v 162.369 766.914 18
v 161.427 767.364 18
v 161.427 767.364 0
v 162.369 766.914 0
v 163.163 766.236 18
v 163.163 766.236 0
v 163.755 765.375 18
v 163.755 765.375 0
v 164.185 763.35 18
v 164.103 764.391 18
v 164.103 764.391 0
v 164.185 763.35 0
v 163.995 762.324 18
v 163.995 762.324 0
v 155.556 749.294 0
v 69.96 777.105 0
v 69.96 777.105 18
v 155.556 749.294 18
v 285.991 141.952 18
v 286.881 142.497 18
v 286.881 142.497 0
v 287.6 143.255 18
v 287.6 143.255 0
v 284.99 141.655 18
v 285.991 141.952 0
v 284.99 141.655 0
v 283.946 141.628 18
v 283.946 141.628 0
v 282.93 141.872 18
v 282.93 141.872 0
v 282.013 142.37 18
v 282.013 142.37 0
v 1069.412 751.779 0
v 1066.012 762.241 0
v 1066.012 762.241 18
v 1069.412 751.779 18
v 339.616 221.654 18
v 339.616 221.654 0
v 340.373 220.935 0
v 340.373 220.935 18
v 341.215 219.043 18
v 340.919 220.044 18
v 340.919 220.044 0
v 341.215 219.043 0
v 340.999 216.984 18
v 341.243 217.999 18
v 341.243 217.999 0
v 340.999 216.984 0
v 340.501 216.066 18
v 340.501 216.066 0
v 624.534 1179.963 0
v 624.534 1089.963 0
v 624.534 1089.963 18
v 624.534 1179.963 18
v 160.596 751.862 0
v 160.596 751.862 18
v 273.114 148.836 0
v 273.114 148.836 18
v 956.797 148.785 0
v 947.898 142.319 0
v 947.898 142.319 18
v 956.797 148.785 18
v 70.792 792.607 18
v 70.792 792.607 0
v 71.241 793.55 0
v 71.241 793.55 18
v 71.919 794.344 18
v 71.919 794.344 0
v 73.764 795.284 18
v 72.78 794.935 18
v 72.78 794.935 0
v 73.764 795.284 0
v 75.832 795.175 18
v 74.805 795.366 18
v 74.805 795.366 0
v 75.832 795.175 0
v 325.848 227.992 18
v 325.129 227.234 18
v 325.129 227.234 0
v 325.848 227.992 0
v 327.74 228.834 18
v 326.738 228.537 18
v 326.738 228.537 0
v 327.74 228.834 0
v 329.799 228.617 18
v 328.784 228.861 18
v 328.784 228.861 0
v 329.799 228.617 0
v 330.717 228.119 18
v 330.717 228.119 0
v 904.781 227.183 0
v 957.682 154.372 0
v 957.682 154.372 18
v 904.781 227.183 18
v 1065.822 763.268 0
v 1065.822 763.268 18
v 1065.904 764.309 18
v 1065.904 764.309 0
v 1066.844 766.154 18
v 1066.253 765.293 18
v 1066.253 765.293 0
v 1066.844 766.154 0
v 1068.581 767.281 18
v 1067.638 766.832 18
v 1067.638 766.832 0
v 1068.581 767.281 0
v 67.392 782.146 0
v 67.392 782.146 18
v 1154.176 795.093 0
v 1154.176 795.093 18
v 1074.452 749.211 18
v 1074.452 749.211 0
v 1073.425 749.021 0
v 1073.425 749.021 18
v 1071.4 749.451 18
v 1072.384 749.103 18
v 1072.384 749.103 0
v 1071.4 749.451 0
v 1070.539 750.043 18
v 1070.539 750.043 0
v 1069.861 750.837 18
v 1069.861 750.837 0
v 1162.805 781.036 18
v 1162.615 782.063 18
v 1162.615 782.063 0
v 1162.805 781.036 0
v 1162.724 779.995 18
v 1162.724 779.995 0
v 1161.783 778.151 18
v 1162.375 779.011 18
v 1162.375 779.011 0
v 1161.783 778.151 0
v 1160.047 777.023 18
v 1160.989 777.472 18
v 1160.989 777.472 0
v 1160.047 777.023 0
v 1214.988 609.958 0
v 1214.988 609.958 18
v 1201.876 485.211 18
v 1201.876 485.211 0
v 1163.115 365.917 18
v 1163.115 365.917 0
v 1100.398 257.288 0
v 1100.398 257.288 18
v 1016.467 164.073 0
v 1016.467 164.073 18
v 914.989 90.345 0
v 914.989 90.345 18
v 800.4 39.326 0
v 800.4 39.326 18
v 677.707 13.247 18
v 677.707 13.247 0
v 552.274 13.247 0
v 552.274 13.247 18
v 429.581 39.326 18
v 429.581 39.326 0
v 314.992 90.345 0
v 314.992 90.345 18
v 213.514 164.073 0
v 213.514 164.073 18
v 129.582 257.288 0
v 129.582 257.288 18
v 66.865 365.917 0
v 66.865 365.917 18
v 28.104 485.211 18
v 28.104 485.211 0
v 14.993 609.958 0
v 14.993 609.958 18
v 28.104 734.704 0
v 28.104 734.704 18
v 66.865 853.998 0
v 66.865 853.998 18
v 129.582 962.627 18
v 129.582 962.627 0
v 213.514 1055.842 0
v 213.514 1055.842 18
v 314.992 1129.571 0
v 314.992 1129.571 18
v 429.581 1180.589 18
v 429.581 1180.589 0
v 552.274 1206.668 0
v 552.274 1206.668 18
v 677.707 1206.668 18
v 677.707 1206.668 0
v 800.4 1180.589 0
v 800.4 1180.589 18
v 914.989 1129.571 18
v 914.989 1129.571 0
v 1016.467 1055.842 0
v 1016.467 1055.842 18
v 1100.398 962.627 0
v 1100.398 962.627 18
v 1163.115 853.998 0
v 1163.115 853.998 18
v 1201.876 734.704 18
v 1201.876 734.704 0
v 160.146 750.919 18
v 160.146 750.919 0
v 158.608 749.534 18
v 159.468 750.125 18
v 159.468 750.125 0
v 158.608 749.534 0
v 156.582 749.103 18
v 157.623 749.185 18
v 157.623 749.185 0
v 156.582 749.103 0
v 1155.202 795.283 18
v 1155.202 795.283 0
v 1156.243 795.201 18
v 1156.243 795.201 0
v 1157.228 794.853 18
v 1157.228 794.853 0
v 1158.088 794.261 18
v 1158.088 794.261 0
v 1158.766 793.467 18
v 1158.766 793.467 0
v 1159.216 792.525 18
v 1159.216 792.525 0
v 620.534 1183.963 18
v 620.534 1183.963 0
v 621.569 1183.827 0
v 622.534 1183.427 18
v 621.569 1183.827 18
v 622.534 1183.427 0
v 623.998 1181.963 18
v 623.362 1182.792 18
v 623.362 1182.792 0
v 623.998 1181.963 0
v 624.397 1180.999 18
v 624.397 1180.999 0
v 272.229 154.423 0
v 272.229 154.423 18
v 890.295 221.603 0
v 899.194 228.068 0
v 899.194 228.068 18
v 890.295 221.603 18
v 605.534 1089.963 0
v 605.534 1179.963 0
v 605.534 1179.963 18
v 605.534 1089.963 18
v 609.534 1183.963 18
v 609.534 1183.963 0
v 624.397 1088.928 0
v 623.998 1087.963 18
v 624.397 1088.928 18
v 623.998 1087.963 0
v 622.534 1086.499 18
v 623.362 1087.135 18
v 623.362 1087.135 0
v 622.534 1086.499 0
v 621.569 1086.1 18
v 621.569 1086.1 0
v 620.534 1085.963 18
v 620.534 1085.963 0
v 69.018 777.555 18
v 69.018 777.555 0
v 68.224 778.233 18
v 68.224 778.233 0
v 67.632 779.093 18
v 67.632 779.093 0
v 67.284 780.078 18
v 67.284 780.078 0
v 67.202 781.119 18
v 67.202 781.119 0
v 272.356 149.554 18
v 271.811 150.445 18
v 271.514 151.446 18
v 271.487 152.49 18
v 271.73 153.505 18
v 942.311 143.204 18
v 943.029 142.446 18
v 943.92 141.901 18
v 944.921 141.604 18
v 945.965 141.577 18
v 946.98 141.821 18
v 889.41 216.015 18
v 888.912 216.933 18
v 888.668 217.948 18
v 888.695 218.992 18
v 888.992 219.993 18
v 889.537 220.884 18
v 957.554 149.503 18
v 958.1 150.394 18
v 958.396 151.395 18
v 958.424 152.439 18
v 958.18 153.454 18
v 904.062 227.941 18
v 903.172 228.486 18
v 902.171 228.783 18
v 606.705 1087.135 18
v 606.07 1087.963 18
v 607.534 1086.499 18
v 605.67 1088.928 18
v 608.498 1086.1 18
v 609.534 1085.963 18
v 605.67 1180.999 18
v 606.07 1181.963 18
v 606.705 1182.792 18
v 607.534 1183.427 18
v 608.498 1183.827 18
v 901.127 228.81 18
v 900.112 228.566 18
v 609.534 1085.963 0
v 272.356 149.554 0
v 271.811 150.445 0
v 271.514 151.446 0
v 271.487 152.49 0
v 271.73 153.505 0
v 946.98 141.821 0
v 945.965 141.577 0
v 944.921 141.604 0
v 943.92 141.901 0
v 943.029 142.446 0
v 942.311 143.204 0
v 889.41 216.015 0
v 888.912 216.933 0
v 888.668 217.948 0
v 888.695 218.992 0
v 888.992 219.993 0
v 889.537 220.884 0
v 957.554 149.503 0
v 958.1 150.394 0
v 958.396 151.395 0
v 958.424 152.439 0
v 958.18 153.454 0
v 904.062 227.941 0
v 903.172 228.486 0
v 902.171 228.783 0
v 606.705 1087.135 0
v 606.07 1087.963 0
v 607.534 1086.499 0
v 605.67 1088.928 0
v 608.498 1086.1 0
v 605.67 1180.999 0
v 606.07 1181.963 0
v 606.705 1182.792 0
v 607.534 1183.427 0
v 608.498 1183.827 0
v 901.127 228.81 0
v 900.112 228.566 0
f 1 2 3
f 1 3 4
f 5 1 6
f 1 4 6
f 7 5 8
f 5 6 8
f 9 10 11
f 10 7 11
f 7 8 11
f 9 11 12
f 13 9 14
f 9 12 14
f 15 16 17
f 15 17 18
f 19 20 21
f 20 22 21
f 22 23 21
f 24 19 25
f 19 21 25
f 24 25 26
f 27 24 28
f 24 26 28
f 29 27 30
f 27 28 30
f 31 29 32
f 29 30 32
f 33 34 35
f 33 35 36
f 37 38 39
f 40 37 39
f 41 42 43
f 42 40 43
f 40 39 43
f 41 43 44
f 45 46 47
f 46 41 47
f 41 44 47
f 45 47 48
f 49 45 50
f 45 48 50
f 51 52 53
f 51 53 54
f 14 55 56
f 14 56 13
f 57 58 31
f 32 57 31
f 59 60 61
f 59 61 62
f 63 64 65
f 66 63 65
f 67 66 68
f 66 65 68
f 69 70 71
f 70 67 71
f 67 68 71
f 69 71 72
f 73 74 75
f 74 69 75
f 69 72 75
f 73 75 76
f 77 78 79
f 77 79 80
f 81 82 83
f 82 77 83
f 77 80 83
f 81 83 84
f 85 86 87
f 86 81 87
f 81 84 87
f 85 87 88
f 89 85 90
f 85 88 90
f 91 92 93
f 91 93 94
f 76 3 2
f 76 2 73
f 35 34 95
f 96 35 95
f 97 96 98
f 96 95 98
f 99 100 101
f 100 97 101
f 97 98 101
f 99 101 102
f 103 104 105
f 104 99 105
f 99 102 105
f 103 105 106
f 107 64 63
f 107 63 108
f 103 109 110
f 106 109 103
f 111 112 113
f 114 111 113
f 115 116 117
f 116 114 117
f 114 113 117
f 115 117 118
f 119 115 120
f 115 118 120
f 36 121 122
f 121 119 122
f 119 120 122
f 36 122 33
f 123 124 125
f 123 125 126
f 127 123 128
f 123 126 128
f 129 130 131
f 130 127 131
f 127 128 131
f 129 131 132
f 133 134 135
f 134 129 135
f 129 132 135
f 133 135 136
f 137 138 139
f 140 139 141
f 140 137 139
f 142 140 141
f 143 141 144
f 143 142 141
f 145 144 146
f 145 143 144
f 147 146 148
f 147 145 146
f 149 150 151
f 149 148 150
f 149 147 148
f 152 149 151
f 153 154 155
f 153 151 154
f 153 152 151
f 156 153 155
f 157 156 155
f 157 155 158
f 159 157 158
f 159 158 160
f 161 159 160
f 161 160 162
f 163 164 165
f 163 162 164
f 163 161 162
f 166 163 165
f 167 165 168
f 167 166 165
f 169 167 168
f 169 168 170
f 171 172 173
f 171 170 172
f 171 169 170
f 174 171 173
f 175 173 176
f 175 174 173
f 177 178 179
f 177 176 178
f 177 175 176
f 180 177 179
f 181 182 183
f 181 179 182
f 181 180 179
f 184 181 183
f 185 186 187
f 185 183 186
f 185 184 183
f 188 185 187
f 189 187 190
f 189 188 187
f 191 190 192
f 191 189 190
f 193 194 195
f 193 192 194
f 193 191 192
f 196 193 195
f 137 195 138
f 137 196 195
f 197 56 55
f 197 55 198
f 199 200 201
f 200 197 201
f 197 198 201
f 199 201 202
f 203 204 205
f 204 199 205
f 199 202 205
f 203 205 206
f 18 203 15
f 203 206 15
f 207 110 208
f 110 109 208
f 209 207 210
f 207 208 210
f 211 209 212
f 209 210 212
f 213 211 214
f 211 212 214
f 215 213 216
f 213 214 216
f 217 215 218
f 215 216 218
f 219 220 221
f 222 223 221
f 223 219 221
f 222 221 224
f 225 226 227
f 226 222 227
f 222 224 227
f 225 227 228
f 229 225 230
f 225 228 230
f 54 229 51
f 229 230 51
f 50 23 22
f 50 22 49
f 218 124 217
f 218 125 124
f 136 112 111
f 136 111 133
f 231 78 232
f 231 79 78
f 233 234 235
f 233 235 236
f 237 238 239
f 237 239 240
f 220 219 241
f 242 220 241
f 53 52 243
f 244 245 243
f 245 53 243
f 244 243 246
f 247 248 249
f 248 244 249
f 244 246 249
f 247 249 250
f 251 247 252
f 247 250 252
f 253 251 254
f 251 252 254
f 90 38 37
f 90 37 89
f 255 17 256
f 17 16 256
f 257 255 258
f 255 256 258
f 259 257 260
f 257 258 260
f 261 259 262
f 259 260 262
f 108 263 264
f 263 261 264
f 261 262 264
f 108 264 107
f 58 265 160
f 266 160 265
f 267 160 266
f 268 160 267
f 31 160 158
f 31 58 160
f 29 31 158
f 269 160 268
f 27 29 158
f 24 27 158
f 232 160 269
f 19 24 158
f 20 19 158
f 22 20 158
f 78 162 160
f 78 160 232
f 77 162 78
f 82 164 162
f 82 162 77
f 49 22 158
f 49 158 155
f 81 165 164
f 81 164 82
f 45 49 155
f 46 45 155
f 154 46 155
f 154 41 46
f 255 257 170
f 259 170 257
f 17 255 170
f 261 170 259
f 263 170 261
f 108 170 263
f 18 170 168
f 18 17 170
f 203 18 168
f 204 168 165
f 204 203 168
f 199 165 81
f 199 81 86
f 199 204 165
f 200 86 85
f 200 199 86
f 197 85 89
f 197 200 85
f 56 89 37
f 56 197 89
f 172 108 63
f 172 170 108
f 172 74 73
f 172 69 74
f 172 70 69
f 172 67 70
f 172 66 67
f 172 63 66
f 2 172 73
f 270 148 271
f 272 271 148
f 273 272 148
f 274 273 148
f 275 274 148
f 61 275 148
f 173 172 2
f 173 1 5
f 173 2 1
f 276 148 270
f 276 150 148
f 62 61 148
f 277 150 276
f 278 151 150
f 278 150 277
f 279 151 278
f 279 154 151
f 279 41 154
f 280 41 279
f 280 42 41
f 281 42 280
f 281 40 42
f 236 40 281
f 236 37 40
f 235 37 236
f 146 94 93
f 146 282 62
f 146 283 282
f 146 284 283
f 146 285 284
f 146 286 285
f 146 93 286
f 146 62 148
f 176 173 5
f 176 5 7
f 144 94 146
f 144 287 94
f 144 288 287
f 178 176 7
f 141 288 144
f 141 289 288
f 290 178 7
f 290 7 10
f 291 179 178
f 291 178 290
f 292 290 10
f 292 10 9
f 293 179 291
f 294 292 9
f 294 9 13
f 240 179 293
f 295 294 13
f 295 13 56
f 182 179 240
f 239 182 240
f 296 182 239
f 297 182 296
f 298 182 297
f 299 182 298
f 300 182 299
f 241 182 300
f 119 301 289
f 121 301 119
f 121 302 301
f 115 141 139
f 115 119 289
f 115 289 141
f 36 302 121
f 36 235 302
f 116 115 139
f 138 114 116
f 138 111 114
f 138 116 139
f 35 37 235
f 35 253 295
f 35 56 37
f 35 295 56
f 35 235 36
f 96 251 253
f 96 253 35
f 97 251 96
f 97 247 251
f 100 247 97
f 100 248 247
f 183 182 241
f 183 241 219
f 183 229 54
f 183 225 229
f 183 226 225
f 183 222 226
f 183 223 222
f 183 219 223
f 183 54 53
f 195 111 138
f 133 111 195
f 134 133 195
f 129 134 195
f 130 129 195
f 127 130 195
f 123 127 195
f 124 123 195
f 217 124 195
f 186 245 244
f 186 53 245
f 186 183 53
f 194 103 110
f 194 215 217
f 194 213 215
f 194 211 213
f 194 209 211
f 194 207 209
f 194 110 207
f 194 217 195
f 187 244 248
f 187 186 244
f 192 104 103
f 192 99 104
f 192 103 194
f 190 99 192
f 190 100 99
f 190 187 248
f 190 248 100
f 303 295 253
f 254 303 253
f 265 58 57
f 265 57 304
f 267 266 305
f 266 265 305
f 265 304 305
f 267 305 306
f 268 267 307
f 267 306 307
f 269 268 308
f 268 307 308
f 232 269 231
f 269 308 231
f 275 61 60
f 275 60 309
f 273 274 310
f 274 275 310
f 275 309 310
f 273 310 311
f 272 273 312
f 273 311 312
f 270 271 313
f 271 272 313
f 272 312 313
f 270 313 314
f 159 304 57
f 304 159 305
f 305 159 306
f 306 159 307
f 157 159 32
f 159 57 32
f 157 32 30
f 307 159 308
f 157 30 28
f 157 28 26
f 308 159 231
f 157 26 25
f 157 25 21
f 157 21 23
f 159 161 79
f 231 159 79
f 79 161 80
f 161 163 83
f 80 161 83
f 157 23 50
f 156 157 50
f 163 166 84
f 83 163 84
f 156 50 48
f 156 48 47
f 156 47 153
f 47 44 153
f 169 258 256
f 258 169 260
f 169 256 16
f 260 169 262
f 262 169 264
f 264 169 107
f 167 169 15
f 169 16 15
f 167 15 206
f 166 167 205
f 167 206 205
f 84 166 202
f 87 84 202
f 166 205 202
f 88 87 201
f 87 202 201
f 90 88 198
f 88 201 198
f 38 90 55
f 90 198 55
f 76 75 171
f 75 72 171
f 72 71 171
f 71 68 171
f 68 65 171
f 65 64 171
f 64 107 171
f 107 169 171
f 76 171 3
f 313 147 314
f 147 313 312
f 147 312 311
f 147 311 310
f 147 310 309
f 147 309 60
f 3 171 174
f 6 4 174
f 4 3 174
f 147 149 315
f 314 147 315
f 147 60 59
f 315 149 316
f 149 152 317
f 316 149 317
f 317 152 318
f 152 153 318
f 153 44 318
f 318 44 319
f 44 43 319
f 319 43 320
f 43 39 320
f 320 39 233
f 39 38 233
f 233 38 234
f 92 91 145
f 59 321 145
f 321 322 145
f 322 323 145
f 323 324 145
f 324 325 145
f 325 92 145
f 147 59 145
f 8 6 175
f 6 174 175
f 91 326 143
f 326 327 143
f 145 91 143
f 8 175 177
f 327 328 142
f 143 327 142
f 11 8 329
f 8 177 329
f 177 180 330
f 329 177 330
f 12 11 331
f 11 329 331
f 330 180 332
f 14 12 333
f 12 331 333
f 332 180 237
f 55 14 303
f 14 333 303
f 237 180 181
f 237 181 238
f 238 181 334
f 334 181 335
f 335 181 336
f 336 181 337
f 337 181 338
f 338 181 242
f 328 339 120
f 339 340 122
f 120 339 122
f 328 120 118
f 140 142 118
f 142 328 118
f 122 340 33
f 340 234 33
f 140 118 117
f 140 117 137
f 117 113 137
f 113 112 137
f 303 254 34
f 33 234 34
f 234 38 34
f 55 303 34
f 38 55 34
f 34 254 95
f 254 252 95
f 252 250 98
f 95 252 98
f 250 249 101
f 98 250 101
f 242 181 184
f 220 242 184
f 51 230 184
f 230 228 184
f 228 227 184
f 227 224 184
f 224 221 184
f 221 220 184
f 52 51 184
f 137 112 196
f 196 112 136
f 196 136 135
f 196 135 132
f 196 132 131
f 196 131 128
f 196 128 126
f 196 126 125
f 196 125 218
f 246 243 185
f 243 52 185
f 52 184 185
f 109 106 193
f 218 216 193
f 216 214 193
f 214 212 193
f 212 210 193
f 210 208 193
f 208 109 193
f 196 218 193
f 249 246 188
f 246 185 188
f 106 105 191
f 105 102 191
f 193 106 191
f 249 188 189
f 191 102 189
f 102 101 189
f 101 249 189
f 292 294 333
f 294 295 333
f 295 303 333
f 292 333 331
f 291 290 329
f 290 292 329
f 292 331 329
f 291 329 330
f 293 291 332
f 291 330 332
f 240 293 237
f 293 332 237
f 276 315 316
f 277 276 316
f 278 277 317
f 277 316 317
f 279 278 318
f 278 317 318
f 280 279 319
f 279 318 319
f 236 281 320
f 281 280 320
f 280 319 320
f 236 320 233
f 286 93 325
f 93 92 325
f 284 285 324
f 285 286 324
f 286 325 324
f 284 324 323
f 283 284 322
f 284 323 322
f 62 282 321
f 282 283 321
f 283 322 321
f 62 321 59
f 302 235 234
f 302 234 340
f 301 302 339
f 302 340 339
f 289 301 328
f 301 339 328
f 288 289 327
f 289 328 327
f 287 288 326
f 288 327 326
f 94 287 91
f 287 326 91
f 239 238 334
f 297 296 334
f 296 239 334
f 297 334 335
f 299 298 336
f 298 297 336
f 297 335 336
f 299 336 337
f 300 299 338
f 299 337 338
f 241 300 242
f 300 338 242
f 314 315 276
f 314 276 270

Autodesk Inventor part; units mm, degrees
ref_plane "YZ Plane" through (0, 0, 0) normal (1, 0, 0) x (0, 1, 0)
ref_plane "XZ Plane" through (0, 0, 0) normal (0, 1, 0) x (-1, 0, 0)
ref_plane "XY Plane" through (0, 0, 0) normal (0, 0, 1) x (1, 0, 0)
sketch "CONTOURS" plane through (0, 0, 0) normal (0, 0, 1) x (1, 0, 0)
  circle A0 centre (614.9903, 609.9576) radius 599.9973
  dimension "d3" = 1199.9946
sketch "HOLES" plane through (0, 0, 0) normal (0, 0, 1) x (1, 0, 0)
  line L0 (1162.6152, 782.0631) -> (1159.216, 792.5247)
  arc A0 (1159.216, 792.5247) -> (1154.1757, 795.0928) centre (1155.4118, 791.2886) ccw
  line L1 (1154.1757, 795.0928) -> (1068.5806, 767.2813)
  arc A1 (1068.5806, 767.2813) -> (1066.0124, 762.241) centre (1069.8167, 763.4771) ccw
  line L2 (1066.0124, 762.241) -> (1069.4116, 751.7794)
  arc A2 (1069.4116, 751.7794) -> (1074.4519, 749.2112) centre (1073.2159, 753.0155) ccw
  line L3 (1074.4519, 749.2112) -> (1160.047, 777.0228)
  arc A3 (1160.047, 777.0228) -> (1162.6152, 782.0631) centre (1158.8109, 780.827) ccw
  line L4 (947.8978, 142.3189) -> (956.7969, 148.7846)
  arc A4 (956.7969, 148.7846) -> (957.6819, 154.3718) centre (954.4458, 152.0206) ccw
  line L5 (957.6819, 154.3718) -> (904.7812, 227.1833)
  arc A5 (904.7812, 227.1833) -> (899.194, 228.0682) centre (901.5451, 224.8322) ccw
  line L6 (899.194, 228.0682) -> (890.2948, 221.6026)
  arc A6 (890.2948, 221.6026) -> (889.4099, 216.0154) centre (892.6459, 218.3665) ccw
  line L7 (889.4099, 216.0154) -> (942.3106, 143.2039)
  arc A7 (942.3106, 143.2039) -> (947.8978, 142.3189) centre (945.5466, 145.555) ccw
  line L8 (620.5337, 1183.9633) -> (609.5337, 1183.9633)
  arc A8 (609.5337, 1183.9633) -> (605.5337, 1179.9633) centre (609.5337, 1179.9633) ccw
  line L9 (605.5337, 1179.9633) -> (605.5337, 1089.9633)
  arc A9 (605.5337, 1089.9633) -> (609.5337, 1085.9633) centre (609.5337, 1089.9633) ccw
  line L10 (609.5337, 1085.9633) -> (620.5337, 1085.9633)
  arc A10 (620.5337, 1085.9633) -> (624.5337, 1089.9633) centre (620.5337, 1089.9633) ccw
  line L11 (624.5337, 1089.9633) -> (624.5337, 1179.9633)
  arc A11 (624.5337, 1179.9633) -> (620.5337, 1183.9633) centre (620.5337, 1179.9633) ccw
  line L12 (273.1136, 148.8355) -> (282.0128, 142.3699)
  arc A12 (282.0128, 142.3699) -> (287.6, 143.2548) centre (284.3639, 145.6059) ccw
  line L13 (287.6, 143.2548) -> (340.5007, 216.0663)
  arc A13 (340.5007, 216.0663) -> (339.6157, 221.6535) centre (337.2646, 218.4175) ccw
  line L14 (339.6157, 221.6535) -> (330.7166, 228.1192)
  arc A14 (330.7166, 228.1192) -> (325.1293, 227.2342) centre (328.3654, 224.8831) ccw
  line L15 (325.1293, 227.2342) -> (272.2287, 154.4227)
  arc A15 (272.2287, 154.4227) -> (273.1136, 148.8355) centre (275.4647, 152.0716) ccw
  line L16 (70.7915, 792.6071) -> (67.3923, 782.1455)
  arc A16 (67.3923, 782.1455) -> (69.9604, 777.1052) centre (71.1965, 780.9094) ccw
  line L17 (69.9604, 777.1052) -> (155.5555, 749.2937)
  arc A17 (155.5555, 749.2937) -> (160.5958, 751.8618) centre (156.7916, 753.0979) ccw
  line L18 (160.5958, 751.8618) -> (163.995, 762.3235)
  arc A18 (163.995, 762.3235) -> (161.4268, 767.3637) centre (160.1908, 763.5595) ccw
  line L19 (161.4268, 767.3637) -> (75.8318, 795.1753)
  arc A19 (75.8318, 795.1753) -> (70.7915, 792.6071) centre (74.5957, 791.371) ccw
  dimension "d1" = 19
  dimension "d19" = 90
sketch "LETTERS" plane through (0, 0, 0) normal (0, 0, 1) x (1, 0, 0)
  line L0 (622.9768, 614.1235) -> (622.8555, 614.5546)
  line L1 (622.8555, 614.5546) -> (622.7333, 614.956)
  line L2 (622.7333, 614.956) -> (622.6101, 615.3276)
  line L3 (622.6101, 615.3276) -> (622.4861, 615.6694)
  line L4 (622.4861, 615.6694) -> (622.4237, 615.8291)
  line L5 (622.4237, 615.8291) -> (622.3611, 615.9814)
  line L6 (622.3611, 615.9814) -> (622.2982, 616.1262)
  line L7 (622.2982, 616.1262) -> (622.2351, 616.2636)
  line L8 (622.2351, 616.2636) -> (622.1718, 616.3935)
  line L9 (622.1718, 616.3935) -> (622.1083, 616.516)
  line L10 (622.1083, 616.516) -> (622.0445, 616.631)
  line L11 (622.0445, 616.631) -> (621.9805, 616.7386)
  line L12 (621.9805, 616.7386) -> (621.9154, 616.8417)
  line L13 (621.9154, 616.8417) -> (621.8484, 616.943)
  line L14 (621.8484, 616.943) -> (621.7795, 617.0428)
  line L15 (621.7795, 617.0428) -> (621.7087, 617.1408)
  line L16 (621.7087, 617.1408) -> (621.6361, 617.2373)
  line L17 (621.6361, 617.2373) -> (621.5615, 617.3321)
  line L18 (621.5615, 617.3321) -> (621.485, 617.4252)
  line L19 (621.485, 617.4252) -> (621.4066, 617.5167)
  line L20 (621.4066, 617.5167) -> (621.3264, 617.6065)
  line L21 (621.3264, 617.6065) -> (621.2442, 617.6947)
  line L22 (621.2442, 617.6947) -> (621.1602, 617.7812)
  line L23 (621.1602, 617.7812) -> (621.0742, 617.8661)
  line L24 (621.0742, 617.8661) -> (620.9864, 617.9494)
  line L25 (620.9864, 617.9494) -> (620.8966, 618.031)
  line L26 (620.8966, 618.031) -> (620.805, 618.1109)
  line L27 (620.805, 618.1109) -> (620.7115, 618.1892)
  line L28 (620.7115, 618.1892) -> (620.5209, 618.3409)
  line L29 (620.5209, 618.3409) -> (620.3269, 618.4859)
  line L30 (620.3269, 618.4859) -> (620.1297, 618.6242)
  line L31 (620.1297, 618.6242) -> (619.9292, 618.756)
  line L32 (619.9292, 618.756) -> (619.7254, 618.8811)
  line L33 (619.7254, 618.8811) -> (619.5183, 618.9995)
  line L34 (619.5183, 618.9995) -> (619.3079, 619.1114)
  line L35 (619.3079, 619.1114) -> (619.0942, 619.2166)
  line L36 (619.0942, 619.2166) -> (618.9858, 619.2666)
  line L37 (618.9858, 619.2666) -> (618.8761, 619.3148)
  line L38 (618.8761, 619.3148) -> (618.765, 619.3612)
  line L39 (618.765, 619.3612) -> (618.6526, 619.4058)
  line L40 (618.6526, 619.4058) -> (618.5388, 619.4485)
  line L41 (618.5388, 619.4485) -> (618.4237, 619.4895)
  line L42 (618.4237, 619.4895) -> (618.3072, 619.5286)
  line L43 (618.3072, 619.5286) -> (618.1894, 619.5658)
  line L44 (618.1894, 619.5658) -> (617.9497, 619.6349)
  line L45 (617.9497, 619.6349) -> (617.7046, 619.6967)
  line L46 (617.7046, 619.6967) -> (617.454, 619.7512)
  line L47 (617.454, 619.7512) -> (617.1981, 619.7984)
  line L48 (617.1981, 619.7984) -> (616.9346, 619.8392)
  line L49 (616.9346, 619.8392) -> (616.6613, 619.8746)
  line L50 (616.6613, 619.8746) -> (616.3784, 619.9045)
  line L51 (616.3784, 619.9045) -> (616.0858, 619.929)
  line L52 (616.0858, 619.929) -> (615.7835, 619.9481)
  line L53 (615.7835, 619.9481) -> (615.4715, 619.9617)
  line L54 (615.4715, 619.9617) -> (614.8184, 619.9726)
  line L55 (614.8184, 619.9726) -> (614.1719, 619.964)
  line L56 (614.1719, 619.964) -> (613.5774, 619.9385)
  line L57 (613.5774, 619.9385) -> (613.2996, 619.9194)
  line L58 (613.2996, 619.9194) -> (613.0349, 619.8959)
  line L59 (613.0349, 619.8959) -> (612.7831, 619.8683)
  line L60 (612.7831, 619.8683) -> (612.5443, 619.8364)
  line L61 (612.5443, 619.8364) -> (612.3121, 619.7985)
  line L62 (612.3121, 619.7985) -> (612.0798, 619.7532)
  line L63 (612.0798, 619.7532) -> (611.8476, 619.7002)
  line L64 (611.8476, 619.7002) -> (611.6153, 619.6397)
  line L65 (611.6153, 619.6397) -> (611.383, 619.5717)
  line L66 (611.383, 619.5717) -> (611.1508, 619.4961)
  line L67 (611.1508, 619.4961) -> (610.9185, 619.4129)
  line L68 (610.9185, 619.4129) -> (610.6862, 619.3222)
  line L69 (610.6862, 619.3222) -> (610.4529, 619.2229)
  line L70 (610.4529, 619.2229) -> (610.2174, 619.1139)
  line L71 (610.2174, 619.1139) -> (609.9798, 618.9952)
  line L72 (609.9798, 618.9952) -> (609.74, 618.8669)
  line L73 (609.74, 618.8669) -> (609.4981, 618.7289)
  line L74 (609.4981, 618.7289) -> (609.2541, 618.5813)
  line L75 (609.2541, 618.5813) -> (609.0078, 618.424)
  line L76 (609.0078, 618.424) -> (608.7595, 618.257)
  line L77 (608.7595, 618.257) -> (608.6356, 618.1697)
  line L78 (608.6356, 618.1697) -> (608.5134, 618.0797)
  line L79 (608.5134, 618.0797) -> (608.3928, 617.987)
  line L80 (608.3928, 617.987) -> (608.2739, 617.8916)
  line L81 (608.2739, 617.8916) -> (608.1567, 617.7935)
  line L82 (608.1567, 617.7935) -> (608.0411, 617.6927)
  line L83 (608.0411, 617.6927) -> (607.9272, 617.5891)
  line L84 (607.9272, 617.5891) -> (607.8149, 617.4828)
  line L85 (607.8149, 617.4828) -> (607.7043, 617.3739)
  line L86 (607.7043, 617.3739) -> (607.5953, 617.2622)
  line L87 (607.5953, 617.2622) -> (607.488, 617.1478)
  line L88 (607.488, 617.1478) -> (607.3824, 617.0307)
  line L89 (607.3824, 617.0307) -> (607.2784, 616.9108)
  line L90 (607.2784, 616.9108) -> (607.176, 616.7883)
  line L91 (607.176, 616.7883) -> (607.0754, 616.663)
  line L92 (607.0754, 616.663) -> (606.9764, 616.5351)
  line L93 (606.9764, 616.5351) -> (606.8795, 616.4051)
  line L94 (606.8795, 616.4051) -> (606.7852, 616.2738)
  line L95 (618.3393, 599.944) -> (618.5538, 599.9977)
  line L96 (618.5538, 599.9977) -> (618.7672, 600.0568)
  line L97 (618.7672, 600.0568) -> (618.9794, 600.1214)
  line L98 (618.9794, 600.1214) -> (619.1905, 600.1913)
  line L99 (619.1905, 600.1913) -> (619.4004, 600.2667)
  line L100 (619.4004, 600.2667) -> (619.6092, 600.3476)
  line L101 (619.6092, 600.3476) -> (619.8168, 600.4339)
  line L102 (619.8168, 600.4339) -> (620.0233, 600.5256)
  line L103 (620.0233, 600.5256) -> (620.2287, 600.6223)
  line L104 (620.2287, 600.6223) -> (620.4332, 600.7235)
  line L105 (620.4332, 600.7235) -> (620.6368, 600.8291)
  line L106 (620.6368, 600.8291) -> (620.8394, 600.9391)
  line L107 (620.8394, 600.9391) -> (621.0411, 601.0536)
  line L108 (621.0411, 601.0536) -> (621.2419, 601.1726)
  line L109 (621.2419, 601.1726) -> (621.4418, 601.296)
  line L110 (621.4418, 601.296) -> (621.6408, 601.4239)
  line L111 (621.6408, 601.4239) -> (622.3722, 601.9163)
  line L112 (622.3722, 601.9163) -> (622.691, 602.1415)
  line L113 (622.691, 602.1415) -> (622.9785, 602.3528)
  line L114 (622.9785, 602.3528) -> (623.4053, 602.6781)
  line L115 (623.4053, 602.6781) -> (623.5311, 602.7785)
  line L116 (623.5311, 602.7785) -> (623.572, 602.8131)
  line L117 (605.8556, 614.5967) -> (605.795, 614.4485)
  line L118 (623.587, 602.8265) -> (623.5931, 602.8322)
  line L119 (623.5931, 602.8322) -> (623.5983, 602.8373)
  line L120 (623.5983, 602.8373) -> (623.5992, 609.9994)
  line L121 (623.5992, 609.9994) -> (615.0012, 610.0005)
  line L122 (605.7369, 614.299) -> (605.5299, 613.7237)
  line L123 (605.5299, 613.7237) -> (605.4413, 613.4552)
  line L124 (605.4413, 613.4552) -> (605.3626, 613.1994)
  line L125 (605.3626, 613.1994) -> (605.294, 612.9564)
  line L126 (605.294, 612.9564) -> (605.2353, 612.7261)
  line L127 (605.2353, 612.7261) -> (605.1866, 612.5085)
  line L128 (605.1866, 612.5085) -> (605.1659, 612.4045)
  line L129 (605.1659, 612.4045) -> (605.1478, 612.3036)
  line L130 (605.1478, 612.3036) -> (605.0844, 611.8916)
  line L131 (605.0844, 611.8916) -> (605.0293, 611.4495)
  line L132 (605.0293, 611.4495) -> (604.9825, 610.9774)
  line L133 (604.9825, 610.9774) -> (604.944, 610.4751)
  line L134 (604.944, 610.4751) -> (604.9301, 610.2143)
  line L135 (604.9301, 610.2143) -> (604.9225, 609.9493)
  line L136 (604.9225, 609.9493) -> (604.9214, 609.68)
  line L137 (604.9214, 609.68) -> (604.9266, 609.4064)
  line L138 (604.9266, 609.4064) -> (604.9383, 609.1286)
  line L139 (604.9383, 609.1286) -> (604.9563, 608.8465)
  line L140 (604.9563, 608.8465) -> (604.9808, 608.5602)
  line L141 (604.9808, 608.5602) -> (605.0116, 608.2696)
  line L142 (605.0116, 608.2696) -> (605.049, 607.9781)
  line L143 (605.049, 607.9781) -> (605.0929, 607.6889)
  line L144 (605.0929, 607.6889) -> (605.1434, 607.4021)
  line L145 (605.1434, 607.4021) -> (605.2006, 607.1176)
  line L146 (605.2006, 607.1176) -> (605.2643, 606.8354)
  line L147 (605.2643, 606.8354) -> (605.3347, 606.5556)
  line L148 (605.3347, 606.5556) -> (605.4116, 606.2781)
  line L149 (605.4116, 606.2781) -> (605.4951, 606.003)
  line L150 (605.4951, 606.003) -> (605.5846, 605.7331)
  line L151 (605.5846, 605.7331) -> (605.6792, 605.4716)
  line L152 (605.6792, 605.4716) -> (605.7791, 605.2183)
  line L153 (605.7791, 605.2183) -> (605.8842, 604.9733)
  line L154 (605.8842, 604.9733) -> (605.9945, 604.7366)
  line L155 (605.9945, 604.7366) -> (606.11, 604.5082)
  line L156 (606.11, 604.5082) -> (606.2307, 604.2881)
  line L157 (606.2307, 604.2881) -> (606.293, 604.1811)
  line L158 (606.293, 604.1811) -> (606.3566, 604.0762)
  line L159 (606.3566, 604.0762) -> (606.4874, 603.8703)
  line L160 (606.4874, 603.8703) -> (606.6226, 603.6678)
  line L161 (606.6226, 603.6678) -> (606.7623, 603.469)
  line L162 (606.7623, 603.469) -> (606.9064, 603.2736)
  line L163 (606.9064, 603.2736) -> (607.055, 603.0818)
  line L164 (607.055, 603.0818) -> (607.208, 602.8935)
  line L165 (607.208, 602.8935) -> (607.3655, 602.7087)
  line L166 (607.3655, 602.7087) -> (607.5275, 602.5274)
  line L167 (607.5275, 602.5274) -> (607.6932, 602.351)
  line L168 (605.795, 614.4485) -> (605.7369, 614.299)
  line L169 (607.6932, 602.351) -> (607.862, 602.1808)
  line L170 (607.862, 602.1808) -> (608.0339, 602.0166)
  line L171 (608.0339, 602.0166) -> (608.2089, 601.8586)
  line L172 (608.2089, 601.8586) -> (608.3871, 601.7068)
  line L173 (608.3871, 601.7068) -> (608.5683, 601.561)
  line L174 (608.5683, 601.561) -> (608.7526, 601.4215)
  line L175 (608.7526, 601.4215) -> (608.94, 601.288)
  line L176 (608.94, 601.288) -> (609.1322, 601.1594)
  line L177 (609.1322, 601.1594) -> (609.3307, 601.0344)
  line L178 (609.3307, 601.0344) -> (609.5356, 600.9129)
  line L179 (609.5356, 600.9129) -> (609.7469, 600.795)
  line L180 (609.7469, 600.795) -> (609.9645, 600.6806)
  line L181 (609.9645, 600.6806) -> (610.1885, 600.5698)
  line L182 (610.1885, 600.5698) -> (610.4189, 600.4626)
  line L183 (610.4189, 600.4626) -> (610.6556, 600.359)
  line L184 (610.6556, 600.359) -> (610.8962, 600.2607)
  line L185 (610.8962, 600.2607) -> (611.1383, 600.1698)
  line L186 (611.1383, 600.1698) -> (611.3818, 600.0861)
  line L187 (611.3818, 600.0861) -> (611.6266, 600.0098)
  line L188 (611.6266, 600.0098) -> (611.8729, 599.9407)
  line L189 (611.8729, 599.9407) -> (612.1207, 599.8789)
  line L190 (612.1207, 599.8789) -> (612.3698, 599.8244)
  line L191 (612.3698, 599.8244) -> (612.6204, 599.7772)
  line L192 (612.6204, 599.7772) -> (613.1224, 599.6968)
  line L193 (613.1224, 599.6968) -> (613.6233, 599.6297)
  line L194 (613.6233, 599.6297) -> (614.1232, 599.5759)
  line L195 (614.1232, 599.5759) -> (614.622, 599.5355)
  line L196 (614.622, 599.5355) -> (614.8702, 599.5218)
  line L197 (614.8702, 599.5218) -> (615.1162, 599.5144)
  line L198 (615.1162, 599.5144) -> (615.3602, 599.5135)
  line L199 (615.3602, 599.5135) -> (615.602, 599.5188)
  line L200 (615.602, 599.5188) -> (615.8418, 599.5306)
  line L201 (615.8418, 599.5306) -> (616.0796, 599.5487)
  line L202 (616.0796, 599.5487) -> (616.3152, 599.5732)
  line L203 (616.3152, 599.5732) -> (616.5488, 599.6041)
  line L204 (616.5488, 599.6041) -> (617.0095, 599.6764)
  line L205 (617.0095, 599.6764) -> (617.4615, 599.7572)
  line L206 (617.4615, 599.7572) -> (617.9047, 599.8464)
  line L207 (617.9047, 599.8464) -> (618.3393, 599.944)
  line L208 (605.9188, 614.7437) -> (605.8556, 614.5967)
  line L209 (605.9846, 614.8893) -> (605.9188, 614.7437)
  line L210 (606.053, 615.0336) -> (605.9846, 614.8893)
  line L211 (606.124, 615.1766) -> (606.053, 615.0336)
  line L212 (606.1976, 615.3183) -> (606.124, 615.1766)
  line L213 (606.2738, 615.4587) -> (606.1976, 615.3183)
  line L214 (606.3525, 615.5978) -> (606.2738, 615.4587)
  line L215 (606.4339, 615.7356) -> (606.3525, 615.5978)
  line L216 (606.5178, 615.8721) -> (606.4339, 615.7356)
  line L217 (606.6043, 616.0073) -> (606.5178, 615.8721)
  line L218 (606.6935, 616.1412) -> (606.6043, 616.0073)
  line L219 (606.7852, 616.2738) -> (606.6935, 616.1412)
  line L220 (623.572, 602.8131) -> (623.587, 602.8265)
extrude "Extrusion4" add sketch "CONTOURS" along normal blind 18
extrude "Extrusion5" cut sketch "HOLES" along normal blind 18
properties part number "Disk G" material "Wood (Birch)"
